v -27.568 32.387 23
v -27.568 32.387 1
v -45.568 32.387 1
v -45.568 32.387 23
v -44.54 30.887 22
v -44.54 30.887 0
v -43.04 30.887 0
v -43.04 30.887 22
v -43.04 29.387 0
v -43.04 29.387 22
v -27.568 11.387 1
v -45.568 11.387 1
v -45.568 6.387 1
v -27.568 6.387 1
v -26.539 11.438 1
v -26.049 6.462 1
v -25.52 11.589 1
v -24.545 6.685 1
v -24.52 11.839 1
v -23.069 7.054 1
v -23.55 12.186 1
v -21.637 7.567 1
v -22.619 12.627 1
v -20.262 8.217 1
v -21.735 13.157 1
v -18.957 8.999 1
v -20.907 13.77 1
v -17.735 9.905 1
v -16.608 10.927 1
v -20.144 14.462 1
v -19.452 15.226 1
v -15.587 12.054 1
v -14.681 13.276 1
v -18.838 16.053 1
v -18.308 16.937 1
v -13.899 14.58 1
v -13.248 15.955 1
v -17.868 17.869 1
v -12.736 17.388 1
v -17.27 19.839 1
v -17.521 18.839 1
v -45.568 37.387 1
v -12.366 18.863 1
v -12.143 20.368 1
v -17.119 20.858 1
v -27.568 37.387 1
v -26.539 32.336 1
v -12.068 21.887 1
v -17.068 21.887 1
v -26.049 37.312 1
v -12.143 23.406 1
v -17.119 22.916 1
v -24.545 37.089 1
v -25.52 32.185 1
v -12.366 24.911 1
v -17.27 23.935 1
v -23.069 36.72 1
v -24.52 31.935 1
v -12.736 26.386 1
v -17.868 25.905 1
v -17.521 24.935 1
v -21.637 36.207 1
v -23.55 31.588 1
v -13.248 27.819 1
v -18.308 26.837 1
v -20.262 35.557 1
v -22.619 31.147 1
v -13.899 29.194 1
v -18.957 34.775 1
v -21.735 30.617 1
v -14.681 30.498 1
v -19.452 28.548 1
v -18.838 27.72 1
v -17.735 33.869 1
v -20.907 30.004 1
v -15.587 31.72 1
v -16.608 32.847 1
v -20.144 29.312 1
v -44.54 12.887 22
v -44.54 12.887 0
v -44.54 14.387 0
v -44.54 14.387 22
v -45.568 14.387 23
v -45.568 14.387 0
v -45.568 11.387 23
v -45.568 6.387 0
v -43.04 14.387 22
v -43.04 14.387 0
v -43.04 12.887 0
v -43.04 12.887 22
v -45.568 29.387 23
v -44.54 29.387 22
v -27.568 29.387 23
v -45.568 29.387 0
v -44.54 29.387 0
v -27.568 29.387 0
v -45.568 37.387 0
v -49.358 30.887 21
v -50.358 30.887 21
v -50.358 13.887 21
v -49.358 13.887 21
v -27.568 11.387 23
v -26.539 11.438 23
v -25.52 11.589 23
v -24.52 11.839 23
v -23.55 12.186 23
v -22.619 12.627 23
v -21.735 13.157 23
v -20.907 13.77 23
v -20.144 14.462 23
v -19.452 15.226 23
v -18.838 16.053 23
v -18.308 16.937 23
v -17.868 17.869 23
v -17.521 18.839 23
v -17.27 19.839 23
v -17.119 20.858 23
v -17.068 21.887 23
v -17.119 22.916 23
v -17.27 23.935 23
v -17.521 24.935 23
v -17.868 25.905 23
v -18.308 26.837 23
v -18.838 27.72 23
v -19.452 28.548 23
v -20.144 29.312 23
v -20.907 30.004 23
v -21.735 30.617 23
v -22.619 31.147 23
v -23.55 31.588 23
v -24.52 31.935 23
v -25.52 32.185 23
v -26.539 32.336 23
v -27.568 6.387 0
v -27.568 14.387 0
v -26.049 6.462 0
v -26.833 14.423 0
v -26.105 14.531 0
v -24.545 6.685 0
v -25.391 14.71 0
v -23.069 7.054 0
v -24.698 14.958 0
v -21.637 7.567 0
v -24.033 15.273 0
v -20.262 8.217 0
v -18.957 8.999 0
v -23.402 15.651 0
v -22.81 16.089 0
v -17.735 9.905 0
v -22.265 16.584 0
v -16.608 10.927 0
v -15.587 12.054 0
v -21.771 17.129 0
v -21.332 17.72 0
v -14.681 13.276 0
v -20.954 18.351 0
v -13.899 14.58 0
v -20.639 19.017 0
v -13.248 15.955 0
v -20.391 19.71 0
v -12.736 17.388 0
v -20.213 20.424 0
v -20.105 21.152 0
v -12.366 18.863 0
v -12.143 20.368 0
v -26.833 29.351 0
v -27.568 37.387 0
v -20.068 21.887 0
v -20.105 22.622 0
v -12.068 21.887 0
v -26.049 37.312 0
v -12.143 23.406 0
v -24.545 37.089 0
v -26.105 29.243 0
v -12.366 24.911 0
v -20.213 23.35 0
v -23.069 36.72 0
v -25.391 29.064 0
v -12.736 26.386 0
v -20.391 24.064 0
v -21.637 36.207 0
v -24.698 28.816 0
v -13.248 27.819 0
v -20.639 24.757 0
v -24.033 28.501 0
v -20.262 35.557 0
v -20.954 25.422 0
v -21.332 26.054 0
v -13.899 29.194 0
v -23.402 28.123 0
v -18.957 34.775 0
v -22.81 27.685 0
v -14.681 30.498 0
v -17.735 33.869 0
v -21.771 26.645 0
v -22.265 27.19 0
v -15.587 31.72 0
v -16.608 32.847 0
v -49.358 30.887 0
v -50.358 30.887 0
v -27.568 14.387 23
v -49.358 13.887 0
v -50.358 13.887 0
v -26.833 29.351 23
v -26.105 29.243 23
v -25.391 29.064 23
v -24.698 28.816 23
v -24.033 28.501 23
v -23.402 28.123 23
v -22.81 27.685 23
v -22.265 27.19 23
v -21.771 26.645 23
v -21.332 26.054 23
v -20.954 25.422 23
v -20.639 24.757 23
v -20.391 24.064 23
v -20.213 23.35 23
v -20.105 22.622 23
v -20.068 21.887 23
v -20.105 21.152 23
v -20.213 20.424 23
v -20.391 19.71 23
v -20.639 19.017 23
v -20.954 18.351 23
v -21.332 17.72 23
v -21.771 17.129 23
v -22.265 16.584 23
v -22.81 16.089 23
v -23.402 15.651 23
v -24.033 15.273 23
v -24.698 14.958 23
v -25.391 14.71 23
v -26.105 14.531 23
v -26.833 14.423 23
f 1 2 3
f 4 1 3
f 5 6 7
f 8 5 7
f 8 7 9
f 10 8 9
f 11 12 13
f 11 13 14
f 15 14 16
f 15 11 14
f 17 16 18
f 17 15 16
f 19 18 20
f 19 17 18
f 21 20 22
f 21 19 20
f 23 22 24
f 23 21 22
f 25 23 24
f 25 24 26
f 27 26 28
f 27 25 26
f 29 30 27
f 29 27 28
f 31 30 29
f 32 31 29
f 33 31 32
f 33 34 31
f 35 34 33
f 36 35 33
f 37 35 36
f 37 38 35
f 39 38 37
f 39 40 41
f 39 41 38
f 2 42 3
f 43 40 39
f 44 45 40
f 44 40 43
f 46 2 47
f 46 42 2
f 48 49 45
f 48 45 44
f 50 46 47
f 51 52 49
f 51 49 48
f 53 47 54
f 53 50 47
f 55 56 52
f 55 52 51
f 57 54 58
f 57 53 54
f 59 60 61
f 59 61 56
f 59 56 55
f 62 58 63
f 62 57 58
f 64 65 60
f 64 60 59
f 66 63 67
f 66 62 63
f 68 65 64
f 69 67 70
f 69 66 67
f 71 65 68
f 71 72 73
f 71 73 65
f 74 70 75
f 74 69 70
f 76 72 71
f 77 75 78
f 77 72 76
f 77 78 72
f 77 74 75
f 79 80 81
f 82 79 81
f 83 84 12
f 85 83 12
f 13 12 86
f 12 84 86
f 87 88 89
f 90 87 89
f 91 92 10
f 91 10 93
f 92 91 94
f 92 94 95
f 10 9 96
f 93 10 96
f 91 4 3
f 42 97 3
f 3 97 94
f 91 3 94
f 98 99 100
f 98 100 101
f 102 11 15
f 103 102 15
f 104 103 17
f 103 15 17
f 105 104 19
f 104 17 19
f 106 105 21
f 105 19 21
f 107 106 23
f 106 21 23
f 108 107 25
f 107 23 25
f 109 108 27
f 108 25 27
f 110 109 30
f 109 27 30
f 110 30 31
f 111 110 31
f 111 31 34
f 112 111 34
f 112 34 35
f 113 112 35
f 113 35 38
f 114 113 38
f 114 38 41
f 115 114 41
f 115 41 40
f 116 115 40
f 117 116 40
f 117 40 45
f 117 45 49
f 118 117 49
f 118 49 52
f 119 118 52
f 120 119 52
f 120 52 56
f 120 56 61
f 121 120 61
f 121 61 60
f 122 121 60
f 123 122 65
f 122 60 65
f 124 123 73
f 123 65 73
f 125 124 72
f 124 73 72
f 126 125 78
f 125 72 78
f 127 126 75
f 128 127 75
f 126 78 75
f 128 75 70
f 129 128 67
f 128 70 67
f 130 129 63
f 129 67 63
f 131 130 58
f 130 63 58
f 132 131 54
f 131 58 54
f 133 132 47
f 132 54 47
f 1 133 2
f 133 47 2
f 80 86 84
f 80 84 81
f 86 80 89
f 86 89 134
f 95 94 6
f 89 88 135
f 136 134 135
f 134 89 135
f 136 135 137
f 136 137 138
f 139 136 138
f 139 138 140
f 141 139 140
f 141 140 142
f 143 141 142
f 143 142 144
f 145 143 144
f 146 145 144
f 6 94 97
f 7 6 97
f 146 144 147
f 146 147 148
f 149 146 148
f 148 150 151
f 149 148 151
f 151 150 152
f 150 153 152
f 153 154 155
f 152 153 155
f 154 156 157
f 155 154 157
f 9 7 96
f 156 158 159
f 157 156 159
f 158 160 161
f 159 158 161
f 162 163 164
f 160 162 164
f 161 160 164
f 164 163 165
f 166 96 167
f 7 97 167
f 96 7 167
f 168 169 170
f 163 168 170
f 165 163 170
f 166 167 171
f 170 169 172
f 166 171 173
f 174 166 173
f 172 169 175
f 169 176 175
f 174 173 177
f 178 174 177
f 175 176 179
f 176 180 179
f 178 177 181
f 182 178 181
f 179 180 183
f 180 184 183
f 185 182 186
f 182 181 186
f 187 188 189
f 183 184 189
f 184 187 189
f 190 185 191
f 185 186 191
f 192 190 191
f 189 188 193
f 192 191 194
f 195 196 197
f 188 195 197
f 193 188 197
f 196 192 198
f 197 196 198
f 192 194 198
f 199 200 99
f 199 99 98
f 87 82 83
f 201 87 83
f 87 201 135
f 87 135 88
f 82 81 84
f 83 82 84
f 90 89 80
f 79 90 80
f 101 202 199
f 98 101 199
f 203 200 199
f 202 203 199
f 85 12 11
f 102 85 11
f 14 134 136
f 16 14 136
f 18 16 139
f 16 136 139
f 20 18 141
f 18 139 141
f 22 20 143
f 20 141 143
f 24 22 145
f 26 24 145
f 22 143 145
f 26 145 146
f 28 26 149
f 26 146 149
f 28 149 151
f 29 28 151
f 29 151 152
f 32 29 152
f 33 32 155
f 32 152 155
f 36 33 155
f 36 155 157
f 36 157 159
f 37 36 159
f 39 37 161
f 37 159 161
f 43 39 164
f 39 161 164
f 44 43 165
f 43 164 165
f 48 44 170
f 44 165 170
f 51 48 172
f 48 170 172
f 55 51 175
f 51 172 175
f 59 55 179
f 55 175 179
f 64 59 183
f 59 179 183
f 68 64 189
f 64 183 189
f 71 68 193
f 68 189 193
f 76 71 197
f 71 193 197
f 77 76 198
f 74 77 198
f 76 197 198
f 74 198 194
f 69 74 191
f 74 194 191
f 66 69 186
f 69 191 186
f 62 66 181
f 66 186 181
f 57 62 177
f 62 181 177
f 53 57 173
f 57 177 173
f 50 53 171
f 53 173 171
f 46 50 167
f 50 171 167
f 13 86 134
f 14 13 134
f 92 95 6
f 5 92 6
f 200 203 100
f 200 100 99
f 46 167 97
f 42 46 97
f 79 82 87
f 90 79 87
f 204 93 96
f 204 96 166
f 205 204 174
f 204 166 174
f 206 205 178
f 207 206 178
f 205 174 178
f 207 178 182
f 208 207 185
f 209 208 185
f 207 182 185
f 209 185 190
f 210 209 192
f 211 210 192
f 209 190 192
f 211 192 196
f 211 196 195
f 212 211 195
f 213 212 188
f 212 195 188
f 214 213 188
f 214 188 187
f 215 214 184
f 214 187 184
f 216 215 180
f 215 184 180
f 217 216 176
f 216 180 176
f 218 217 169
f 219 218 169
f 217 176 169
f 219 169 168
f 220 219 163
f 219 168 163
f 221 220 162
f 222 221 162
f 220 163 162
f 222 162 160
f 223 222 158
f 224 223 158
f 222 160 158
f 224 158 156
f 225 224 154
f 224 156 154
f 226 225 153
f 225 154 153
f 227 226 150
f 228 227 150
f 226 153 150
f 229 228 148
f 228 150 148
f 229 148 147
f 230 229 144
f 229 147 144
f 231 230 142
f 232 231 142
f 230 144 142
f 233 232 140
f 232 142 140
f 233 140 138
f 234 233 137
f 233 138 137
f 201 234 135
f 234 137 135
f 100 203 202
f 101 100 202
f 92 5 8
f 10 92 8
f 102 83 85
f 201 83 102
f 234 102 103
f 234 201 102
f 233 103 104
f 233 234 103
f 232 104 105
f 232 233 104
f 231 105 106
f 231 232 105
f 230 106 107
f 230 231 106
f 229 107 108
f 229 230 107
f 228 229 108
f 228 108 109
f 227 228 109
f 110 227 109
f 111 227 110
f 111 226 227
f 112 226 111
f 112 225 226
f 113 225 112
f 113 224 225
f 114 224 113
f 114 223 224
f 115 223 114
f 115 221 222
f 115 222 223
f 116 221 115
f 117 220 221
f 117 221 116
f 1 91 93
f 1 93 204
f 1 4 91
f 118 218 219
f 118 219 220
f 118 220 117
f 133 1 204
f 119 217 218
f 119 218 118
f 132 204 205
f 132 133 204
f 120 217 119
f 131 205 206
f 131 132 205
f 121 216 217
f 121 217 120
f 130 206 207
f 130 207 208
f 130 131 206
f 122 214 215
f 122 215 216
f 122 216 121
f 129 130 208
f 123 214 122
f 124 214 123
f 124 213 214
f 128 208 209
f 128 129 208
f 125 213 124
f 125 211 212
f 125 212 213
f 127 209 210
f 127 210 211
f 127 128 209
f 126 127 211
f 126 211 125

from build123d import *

# Parameters (mm, degrees)
F1_DEPTH = 1
F2_DEPTH = 23
F3_START = 22
F0_W     = 1.5
F0_H     = 1.5
F3_DEPTH = 1
F0_W_2   = 1
F0_H_2   = 17
F4_DEPTH = 21


with BuildPart() as f1:
    # F0 (on Top) → F1 (new body)
    with BuildSketch(Plane.XY):
        with BuildLine():
            Line((-45.5684255958, 37.3869501054), (-45.5684255958, 32.3869501054))
            Line((-45.5684255958, 32.3869501054), (-27.5684255958, 32.3869501054))
            ThreePointArc((-27.5684255958, 32.3869501054), (-17.0684255958, 21.8869501054), (-27.5684255958, 11.3869501054))
            Line((-27.5684255958, 11.3869501054), (-45.5684255958, 11.3869501054))
            Line((-45.5684255958, 11.3869501054), (-45.5684255958, 6.3869501054))
            Line((-45.5684255958, 6.3869501054), (-27.5684255958, 6.3869501054))
            ThreePointArc((-27.5684255958, 6.3869501054), (-12.0684255958, 21.8869501054), (-27.5684255958, 37.3869501054))
            Line((-27.5684255958, 37.3869501054), (-45.5684255958, 37.3869501054))
        make_face()
    extrude(amount=F1_DEPTH)

    # F0 (on Top) → F2 (join)
    with BuildSketch(Plane.XY):
        with BuildLine():
            Line((-45.5684255958, 32.3869501054), (-45.5684255958, 29.3869501054))
            Line((-45.5684255958, 29.3869501054), (-44.5403903723, 29.3869501054))
            Line((-44.5403903723, 29.3869501054), (-44.5403903723, 30.8869501054))
            Line((-44.5403903723, 30.8869501054), (-43.0403903723, 30.8869501054))
            Line((-43.0403903723, 30.8869501054), (-43.0403903723, 29.3869501054))
            Line((-43.0403903723, 29.3869501054), (-27.5684255958, 29.3869501054))
            ThreePointArc((-27.5684255958, 29.3869501054), (-20.0684255958, 21.8869501054), (-27.5684255958, 14.3869501054))
            Line((-27.5684255958, 14.3869501054), (-43.0403903723, 14.3869501054))
            Line((-43.0403903723, 14.3869501054), (-43.0403903723, 12.8869501054))
            Line((-43.0403903723, 12.8869501054), (-44.5403903723, 12.8869501054))
            Line((-44.5403903723, 12.8869501054), (-44.5403903723, 14.3869501054))
            Line((-44.5403903723, 14.3869501054), (-45.5684255958, 14.3869501054))
            Line((-45.5684255958, 14.3869501054), (-45.5684255958, 11.3869501054))
            Line((-45.5684255958, 11.3869501054), (-27.5684255958, 11.3869501054))
            ThreePointArc((-27.5684255958, 11.3869501054), (-17.0684255958, 21.8869501054), (-27.5684255958, 32.3869501054))
            Line((-27.5684255958, 32.3869501054), (-45.5684255958, 32.3869501054))
        make_face()
    extrude(amount=F2_DEPTH)

    # F0 (on Top) → F3 (join)
    with BuildSketch(Plane.XY.offset(F3_START)):
        with Locations((-43.7903903723, 30.1369501054)):
            Rectangle(F0_W, F0_H)
        with Locations((-43.7903903723, 13.6369501054)):
            Rectangle(F0_W, F0_H)
    extrude(amount=F3_DEPTH)


with BuildPart() as f4:
    # F0 (on Top) → F4 (new body)
    with BuildSketch(Plane.XY):
        with Locations((-49.8578819335, 22.3869501054)):
            Rectangle(F0_W_2, F0_H_2)
    extrude(amount=F4_DEPTH)


solid = Compound([f1.part, f4.part])
